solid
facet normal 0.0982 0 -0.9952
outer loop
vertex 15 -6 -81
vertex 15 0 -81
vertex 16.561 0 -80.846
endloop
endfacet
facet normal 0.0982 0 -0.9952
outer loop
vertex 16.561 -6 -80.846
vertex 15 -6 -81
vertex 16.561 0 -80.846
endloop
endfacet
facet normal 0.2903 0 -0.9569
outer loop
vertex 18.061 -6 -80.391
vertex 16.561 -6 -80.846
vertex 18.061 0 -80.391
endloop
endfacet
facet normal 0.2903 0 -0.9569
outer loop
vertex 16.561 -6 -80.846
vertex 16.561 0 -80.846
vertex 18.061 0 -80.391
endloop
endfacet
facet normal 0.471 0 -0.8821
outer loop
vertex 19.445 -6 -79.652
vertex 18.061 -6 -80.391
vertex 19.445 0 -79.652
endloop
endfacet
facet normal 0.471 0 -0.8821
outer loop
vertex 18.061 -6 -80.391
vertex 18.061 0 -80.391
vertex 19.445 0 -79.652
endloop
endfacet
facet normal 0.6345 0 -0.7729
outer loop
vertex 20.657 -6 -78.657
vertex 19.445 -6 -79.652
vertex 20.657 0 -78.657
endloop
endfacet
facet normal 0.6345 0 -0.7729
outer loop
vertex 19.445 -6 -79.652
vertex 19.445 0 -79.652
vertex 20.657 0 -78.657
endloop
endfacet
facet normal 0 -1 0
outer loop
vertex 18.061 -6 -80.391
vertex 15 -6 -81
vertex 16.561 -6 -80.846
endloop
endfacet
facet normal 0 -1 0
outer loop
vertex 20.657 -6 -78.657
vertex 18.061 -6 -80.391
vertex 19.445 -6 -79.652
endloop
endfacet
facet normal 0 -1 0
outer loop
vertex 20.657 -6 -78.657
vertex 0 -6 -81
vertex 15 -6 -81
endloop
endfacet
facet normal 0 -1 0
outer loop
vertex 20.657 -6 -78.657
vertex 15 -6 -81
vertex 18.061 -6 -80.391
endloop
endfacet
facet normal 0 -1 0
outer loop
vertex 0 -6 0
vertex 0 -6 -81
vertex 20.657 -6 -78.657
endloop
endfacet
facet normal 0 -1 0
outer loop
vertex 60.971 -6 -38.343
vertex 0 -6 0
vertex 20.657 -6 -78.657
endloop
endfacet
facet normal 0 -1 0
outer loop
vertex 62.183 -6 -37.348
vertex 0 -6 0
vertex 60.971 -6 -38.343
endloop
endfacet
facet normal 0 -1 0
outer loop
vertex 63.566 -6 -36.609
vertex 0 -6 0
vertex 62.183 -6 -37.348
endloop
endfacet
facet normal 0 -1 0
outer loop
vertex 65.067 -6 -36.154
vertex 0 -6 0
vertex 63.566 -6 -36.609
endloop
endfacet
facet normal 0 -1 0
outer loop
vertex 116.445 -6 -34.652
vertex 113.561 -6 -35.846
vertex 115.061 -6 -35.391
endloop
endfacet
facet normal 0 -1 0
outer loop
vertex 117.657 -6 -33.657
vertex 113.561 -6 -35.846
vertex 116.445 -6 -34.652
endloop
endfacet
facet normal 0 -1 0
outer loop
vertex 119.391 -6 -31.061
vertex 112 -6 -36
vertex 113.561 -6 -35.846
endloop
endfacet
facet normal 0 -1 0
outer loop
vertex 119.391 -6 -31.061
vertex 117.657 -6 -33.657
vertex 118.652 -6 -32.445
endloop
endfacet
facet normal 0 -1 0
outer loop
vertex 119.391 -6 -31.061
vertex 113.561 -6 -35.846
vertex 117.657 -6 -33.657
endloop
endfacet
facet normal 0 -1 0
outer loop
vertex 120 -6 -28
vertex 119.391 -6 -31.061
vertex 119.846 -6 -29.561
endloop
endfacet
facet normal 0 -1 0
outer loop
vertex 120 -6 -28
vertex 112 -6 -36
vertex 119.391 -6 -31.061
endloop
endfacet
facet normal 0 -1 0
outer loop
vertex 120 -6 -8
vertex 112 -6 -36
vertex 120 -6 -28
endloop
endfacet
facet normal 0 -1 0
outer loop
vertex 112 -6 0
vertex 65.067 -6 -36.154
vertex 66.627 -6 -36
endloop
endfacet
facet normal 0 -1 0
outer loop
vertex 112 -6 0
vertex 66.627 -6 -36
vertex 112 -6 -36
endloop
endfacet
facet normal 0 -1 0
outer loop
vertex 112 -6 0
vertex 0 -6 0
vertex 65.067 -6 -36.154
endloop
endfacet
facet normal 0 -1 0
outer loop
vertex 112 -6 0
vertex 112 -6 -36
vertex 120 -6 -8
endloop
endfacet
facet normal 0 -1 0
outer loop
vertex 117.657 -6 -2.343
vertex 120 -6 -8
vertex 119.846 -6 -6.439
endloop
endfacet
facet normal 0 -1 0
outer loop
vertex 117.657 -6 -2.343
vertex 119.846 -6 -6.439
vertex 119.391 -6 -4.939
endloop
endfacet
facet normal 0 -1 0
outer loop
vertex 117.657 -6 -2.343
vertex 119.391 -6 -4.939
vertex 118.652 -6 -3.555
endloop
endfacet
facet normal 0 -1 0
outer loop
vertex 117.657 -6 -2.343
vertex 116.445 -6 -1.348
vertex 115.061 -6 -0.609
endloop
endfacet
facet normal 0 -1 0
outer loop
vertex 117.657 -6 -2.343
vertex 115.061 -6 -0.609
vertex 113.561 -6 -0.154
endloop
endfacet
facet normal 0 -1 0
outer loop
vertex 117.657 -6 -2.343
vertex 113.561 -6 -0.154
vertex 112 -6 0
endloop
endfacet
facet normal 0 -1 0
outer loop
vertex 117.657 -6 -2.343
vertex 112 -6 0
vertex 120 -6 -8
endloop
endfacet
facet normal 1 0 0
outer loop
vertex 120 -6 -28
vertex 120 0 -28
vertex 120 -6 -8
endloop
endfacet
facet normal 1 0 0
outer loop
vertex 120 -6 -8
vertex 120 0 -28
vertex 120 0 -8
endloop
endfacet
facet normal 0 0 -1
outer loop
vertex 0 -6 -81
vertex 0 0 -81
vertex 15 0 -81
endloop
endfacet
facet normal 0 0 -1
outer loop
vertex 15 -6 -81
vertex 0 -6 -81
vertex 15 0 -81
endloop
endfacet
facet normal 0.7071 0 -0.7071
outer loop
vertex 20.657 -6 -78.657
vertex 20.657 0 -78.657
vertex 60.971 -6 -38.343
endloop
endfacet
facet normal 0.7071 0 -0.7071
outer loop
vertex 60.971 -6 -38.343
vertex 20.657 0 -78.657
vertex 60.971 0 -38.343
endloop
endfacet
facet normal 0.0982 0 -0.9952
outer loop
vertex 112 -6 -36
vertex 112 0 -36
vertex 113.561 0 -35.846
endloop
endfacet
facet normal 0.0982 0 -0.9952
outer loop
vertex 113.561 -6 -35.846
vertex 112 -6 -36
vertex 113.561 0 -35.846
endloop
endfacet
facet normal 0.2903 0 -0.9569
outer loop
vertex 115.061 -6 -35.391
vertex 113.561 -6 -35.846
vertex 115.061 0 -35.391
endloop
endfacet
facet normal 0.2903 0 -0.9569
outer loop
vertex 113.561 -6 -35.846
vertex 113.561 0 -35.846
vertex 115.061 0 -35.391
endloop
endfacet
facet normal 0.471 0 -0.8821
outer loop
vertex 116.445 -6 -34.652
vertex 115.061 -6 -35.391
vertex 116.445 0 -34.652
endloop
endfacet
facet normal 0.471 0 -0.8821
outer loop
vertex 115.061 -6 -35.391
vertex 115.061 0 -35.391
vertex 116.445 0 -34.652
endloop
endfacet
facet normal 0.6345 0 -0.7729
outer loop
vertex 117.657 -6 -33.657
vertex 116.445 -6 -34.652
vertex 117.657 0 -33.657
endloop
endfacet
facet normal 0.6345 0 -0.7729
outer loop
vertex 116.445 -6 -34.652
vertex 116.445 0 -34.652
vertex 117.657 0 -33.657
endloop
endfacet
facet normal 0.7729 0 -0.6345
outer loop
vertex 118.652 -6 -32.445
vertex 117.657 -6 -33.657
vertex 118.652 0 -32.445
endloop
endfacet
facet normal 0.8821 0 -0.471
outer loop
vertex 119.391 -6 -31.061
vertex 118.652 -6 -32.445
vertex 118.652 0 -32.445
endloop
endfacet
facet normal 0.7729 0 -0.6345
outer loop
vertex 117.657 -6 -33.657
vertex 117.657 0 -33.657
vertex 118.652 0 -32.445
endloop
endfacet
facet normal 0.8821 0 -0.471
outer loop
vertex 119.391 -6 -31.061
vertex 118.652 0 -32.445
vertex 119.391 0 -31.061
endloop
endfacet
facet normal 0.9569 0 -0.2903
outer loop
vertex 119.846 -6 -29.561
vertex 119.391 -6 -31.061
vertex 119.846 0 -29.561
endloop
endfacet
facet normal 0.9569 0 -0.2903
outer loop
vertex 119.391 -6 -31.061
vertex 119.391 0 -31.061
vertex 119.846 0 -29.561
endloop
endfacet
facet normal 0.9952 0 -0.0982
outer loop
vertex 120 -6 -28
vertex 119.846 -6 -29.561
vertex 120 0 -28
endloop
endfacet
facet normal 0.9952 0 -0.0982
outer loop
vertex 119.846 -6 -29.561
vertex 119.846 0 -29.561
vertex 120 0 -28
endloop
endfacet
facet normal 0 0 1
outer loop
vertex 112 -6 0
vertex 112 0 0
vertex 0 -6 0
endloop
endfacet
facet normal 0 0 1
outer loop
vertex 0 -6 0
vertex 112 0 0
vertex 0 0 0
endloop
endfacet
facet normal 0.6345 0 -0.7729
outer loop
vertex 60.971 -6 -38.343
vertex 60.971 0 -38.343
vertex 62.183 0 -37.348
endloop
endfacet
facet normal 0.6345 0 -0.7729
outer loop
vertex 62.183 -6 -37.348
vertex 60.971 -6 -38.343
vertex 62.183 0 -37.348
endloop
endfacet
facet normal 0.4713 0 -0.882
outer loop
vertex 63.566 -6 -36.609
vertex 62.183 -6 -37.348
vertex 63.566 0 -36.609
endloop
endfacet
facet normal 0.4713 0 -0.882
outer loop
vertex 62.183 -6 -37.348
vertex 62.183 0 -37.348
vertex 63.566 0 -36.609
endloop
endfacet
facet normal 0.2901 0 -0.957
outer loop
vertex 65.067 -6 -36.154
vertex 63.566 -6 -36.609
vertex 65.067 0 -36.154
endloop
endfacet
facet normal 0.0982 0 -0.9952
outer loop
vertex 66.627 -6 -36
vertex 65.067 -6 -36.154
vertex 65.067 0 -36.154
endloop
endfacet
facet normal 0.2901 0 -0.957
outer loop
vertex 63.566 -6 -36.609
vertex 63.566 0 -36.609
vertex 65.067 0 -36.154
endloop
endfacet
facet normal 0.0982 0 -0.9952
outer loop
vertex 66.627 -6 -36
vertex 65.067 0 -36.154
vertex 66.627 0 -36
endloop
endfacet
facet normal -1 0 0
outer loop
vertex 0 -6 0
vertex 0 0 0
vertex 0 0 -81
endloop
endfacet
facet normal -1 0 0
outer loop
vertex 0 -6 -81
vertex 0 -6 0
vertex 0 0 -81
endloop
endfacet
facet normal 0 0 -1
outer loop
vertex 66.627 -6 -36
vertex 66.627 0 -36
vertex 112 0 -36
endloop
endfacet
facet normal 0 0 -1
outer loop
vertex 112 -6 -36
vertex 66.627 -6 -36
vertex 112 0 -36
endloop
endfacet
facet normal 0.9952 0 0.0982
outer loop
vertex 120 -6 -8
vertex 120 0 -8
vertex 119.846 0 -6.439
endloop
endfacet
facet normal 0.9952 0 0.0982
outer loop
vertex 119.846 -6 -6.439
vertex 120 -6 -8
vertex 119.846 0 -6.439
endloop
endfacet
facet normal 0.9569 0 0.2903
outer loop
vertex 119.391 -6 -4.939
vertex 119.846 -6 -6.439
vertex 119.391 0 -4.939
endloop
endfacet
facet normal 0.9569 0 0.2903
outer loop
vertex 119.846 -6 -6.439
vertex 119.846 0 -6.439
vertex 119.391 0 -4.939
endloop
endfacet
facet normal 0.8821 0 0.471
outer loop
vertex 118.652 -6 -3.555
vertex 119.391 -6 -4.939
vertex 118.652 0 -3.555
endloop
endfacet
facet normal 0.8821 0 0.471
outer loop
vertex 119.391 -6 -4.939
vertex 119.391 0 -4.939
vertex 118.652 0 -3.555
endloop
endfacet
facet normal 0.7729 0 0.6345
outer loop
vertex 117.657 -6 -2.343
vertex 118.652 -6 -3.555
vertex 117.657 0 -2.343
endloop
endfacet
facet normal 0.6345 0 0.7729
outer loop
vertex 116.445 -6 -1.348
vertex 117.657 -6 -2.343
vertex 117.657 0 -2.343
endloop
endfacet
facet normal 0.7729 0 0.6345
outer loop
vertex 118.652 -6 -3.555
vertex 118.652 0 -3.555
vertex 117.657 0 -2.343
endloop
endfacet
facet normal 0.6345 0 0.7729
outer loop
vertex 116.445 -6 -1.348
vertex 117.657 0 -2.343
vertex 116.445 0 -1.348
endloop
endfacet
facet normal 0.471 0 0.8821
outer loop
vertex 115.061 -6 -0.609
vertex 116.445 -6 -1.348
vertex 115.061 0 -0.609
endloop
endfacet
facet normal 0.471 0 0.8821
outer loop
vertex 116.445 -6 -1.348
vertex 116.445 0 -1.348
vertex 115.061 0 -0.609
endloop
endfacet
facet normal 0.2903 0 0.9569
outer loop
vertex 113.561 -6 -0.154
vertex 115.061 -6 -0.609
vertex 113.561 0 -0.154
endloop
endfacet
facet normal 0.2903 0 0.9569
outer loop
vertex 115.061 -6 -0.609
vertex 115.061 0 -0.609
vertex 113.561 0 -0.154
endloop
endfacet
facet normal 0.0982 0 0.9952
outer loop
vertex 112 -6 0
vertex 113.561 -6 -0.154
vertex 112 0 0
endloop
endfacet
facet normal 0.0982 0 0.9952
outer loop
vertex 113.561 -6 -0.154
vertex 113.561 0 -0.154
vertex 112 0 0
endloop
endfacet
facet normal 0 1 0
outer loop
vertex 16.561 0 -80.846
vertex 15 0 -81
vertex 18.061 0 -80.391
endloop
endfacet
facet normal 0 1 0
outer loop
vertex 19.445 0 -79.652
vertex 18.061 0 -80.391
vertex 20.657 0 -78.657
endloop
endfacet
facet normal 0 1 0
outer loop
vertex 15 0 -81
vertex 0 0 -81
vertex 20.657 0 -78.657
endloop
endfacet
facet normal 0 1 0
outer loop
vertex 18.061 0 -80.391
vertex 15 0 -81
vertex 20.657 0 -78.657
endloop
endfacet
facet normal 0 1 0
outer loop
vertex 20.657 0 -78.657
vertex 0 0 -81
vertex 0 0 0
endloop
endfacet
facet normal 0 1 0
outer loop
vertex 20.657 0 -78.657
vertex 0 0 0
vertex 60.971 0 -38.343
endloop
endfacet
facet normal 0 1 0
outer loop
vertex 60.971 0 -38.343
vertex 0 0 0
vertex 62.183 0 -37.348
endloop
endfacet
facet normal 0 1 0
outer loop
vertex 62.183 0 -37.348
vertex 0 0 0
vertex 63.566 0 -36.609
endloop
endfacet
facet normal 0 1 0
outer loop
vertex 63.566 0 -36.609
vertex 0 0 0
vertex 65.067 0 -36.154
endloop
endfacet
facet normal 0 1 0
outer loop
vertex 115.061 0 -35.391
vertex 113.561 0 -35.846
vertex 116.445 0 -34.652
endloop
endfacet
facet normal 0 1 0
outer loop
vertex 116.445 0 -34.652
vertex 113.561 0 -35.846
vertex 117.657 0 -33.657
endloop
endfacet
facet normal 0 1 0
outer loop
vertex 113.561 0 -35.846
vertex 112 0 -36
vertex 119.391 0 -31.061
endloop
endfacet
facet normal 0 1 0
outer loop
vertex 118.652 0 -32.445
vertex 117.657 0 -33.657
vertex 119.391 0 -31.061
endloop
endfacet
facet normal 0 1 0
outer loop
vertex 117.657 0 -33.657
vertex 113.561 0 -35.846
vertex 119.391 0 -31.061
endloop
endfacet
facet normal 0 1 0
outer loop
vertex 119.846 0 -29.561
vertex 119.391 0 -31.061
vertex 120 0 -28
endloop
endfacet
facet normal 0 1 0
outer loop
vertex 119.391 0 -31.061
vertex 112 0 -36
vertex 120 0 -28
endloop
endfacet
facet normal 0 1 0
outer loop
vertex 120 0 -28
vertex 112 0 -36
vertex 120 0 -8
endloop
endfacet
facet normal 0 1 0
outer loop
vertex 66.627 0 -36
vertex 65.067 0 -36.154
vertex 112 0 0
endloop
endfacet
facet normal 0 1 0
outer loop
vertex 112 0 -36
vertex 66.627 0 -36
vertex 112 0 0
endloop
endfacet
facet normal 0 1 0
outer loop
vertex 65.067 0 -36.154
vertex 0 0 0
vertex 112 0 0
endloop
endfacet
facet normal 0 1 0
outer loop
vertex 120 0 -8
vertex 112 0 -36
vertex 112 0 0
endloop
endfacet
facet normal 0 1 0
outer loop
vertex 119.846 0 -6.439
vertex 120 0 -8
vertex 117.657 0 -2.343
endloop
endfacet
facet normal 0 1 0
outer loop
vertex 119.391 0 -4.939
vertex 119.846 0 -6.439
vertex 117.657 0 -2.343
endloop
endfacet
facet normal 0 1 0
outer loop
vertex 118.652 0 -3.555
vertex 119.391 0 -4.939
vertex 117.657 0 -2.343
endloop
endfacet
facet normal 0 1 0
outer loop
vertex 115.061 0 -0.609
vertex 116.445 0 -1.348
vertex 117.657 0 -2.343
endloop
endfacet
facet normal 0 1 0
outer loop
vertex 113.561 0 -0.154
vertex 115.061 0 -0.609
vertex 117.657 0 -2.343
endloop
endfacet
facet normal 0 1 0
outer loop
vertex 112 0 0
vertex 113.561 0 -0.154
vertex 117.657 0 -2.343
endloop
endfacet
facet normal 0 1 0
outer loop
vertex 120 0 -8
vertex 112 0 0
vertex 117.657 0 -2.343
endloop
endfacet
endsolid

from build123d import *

# Parameters (mm, degrees)
F1_DEPTH = 6


with BuildPart() as f1:
    # F0 (on Front) → F1 (new body)
    with BuildSketch(Plane.XZ):
        with BuildLine():
            ThreePointArc((15, -81), (18.061467, -80.391036), (20.656854, -78.656854))
            Line((20.656854, -78.656854), (60.970563, -38.343146))
            ThreePointArc((60.970563, -38.343146), (63.56595, -36.608964), (66.627417, -36))
            Line((66.627417, -36), (112, -36))
            ThreePointArc((112, -36), (117.656854, -33.656854), (120, -28))
            Line((120, -28), (120, -8))
            ThreePointArc((120, -8), (117.656854, -2.343146), (112, 0))
            Line((112, 0), (0, 0))
            Line((0, 0), (0, -81))
            Line((0, -81), (15, -81))
        make_face()
    extrude(amount=F1_DEPTH)


solid = f1.part
